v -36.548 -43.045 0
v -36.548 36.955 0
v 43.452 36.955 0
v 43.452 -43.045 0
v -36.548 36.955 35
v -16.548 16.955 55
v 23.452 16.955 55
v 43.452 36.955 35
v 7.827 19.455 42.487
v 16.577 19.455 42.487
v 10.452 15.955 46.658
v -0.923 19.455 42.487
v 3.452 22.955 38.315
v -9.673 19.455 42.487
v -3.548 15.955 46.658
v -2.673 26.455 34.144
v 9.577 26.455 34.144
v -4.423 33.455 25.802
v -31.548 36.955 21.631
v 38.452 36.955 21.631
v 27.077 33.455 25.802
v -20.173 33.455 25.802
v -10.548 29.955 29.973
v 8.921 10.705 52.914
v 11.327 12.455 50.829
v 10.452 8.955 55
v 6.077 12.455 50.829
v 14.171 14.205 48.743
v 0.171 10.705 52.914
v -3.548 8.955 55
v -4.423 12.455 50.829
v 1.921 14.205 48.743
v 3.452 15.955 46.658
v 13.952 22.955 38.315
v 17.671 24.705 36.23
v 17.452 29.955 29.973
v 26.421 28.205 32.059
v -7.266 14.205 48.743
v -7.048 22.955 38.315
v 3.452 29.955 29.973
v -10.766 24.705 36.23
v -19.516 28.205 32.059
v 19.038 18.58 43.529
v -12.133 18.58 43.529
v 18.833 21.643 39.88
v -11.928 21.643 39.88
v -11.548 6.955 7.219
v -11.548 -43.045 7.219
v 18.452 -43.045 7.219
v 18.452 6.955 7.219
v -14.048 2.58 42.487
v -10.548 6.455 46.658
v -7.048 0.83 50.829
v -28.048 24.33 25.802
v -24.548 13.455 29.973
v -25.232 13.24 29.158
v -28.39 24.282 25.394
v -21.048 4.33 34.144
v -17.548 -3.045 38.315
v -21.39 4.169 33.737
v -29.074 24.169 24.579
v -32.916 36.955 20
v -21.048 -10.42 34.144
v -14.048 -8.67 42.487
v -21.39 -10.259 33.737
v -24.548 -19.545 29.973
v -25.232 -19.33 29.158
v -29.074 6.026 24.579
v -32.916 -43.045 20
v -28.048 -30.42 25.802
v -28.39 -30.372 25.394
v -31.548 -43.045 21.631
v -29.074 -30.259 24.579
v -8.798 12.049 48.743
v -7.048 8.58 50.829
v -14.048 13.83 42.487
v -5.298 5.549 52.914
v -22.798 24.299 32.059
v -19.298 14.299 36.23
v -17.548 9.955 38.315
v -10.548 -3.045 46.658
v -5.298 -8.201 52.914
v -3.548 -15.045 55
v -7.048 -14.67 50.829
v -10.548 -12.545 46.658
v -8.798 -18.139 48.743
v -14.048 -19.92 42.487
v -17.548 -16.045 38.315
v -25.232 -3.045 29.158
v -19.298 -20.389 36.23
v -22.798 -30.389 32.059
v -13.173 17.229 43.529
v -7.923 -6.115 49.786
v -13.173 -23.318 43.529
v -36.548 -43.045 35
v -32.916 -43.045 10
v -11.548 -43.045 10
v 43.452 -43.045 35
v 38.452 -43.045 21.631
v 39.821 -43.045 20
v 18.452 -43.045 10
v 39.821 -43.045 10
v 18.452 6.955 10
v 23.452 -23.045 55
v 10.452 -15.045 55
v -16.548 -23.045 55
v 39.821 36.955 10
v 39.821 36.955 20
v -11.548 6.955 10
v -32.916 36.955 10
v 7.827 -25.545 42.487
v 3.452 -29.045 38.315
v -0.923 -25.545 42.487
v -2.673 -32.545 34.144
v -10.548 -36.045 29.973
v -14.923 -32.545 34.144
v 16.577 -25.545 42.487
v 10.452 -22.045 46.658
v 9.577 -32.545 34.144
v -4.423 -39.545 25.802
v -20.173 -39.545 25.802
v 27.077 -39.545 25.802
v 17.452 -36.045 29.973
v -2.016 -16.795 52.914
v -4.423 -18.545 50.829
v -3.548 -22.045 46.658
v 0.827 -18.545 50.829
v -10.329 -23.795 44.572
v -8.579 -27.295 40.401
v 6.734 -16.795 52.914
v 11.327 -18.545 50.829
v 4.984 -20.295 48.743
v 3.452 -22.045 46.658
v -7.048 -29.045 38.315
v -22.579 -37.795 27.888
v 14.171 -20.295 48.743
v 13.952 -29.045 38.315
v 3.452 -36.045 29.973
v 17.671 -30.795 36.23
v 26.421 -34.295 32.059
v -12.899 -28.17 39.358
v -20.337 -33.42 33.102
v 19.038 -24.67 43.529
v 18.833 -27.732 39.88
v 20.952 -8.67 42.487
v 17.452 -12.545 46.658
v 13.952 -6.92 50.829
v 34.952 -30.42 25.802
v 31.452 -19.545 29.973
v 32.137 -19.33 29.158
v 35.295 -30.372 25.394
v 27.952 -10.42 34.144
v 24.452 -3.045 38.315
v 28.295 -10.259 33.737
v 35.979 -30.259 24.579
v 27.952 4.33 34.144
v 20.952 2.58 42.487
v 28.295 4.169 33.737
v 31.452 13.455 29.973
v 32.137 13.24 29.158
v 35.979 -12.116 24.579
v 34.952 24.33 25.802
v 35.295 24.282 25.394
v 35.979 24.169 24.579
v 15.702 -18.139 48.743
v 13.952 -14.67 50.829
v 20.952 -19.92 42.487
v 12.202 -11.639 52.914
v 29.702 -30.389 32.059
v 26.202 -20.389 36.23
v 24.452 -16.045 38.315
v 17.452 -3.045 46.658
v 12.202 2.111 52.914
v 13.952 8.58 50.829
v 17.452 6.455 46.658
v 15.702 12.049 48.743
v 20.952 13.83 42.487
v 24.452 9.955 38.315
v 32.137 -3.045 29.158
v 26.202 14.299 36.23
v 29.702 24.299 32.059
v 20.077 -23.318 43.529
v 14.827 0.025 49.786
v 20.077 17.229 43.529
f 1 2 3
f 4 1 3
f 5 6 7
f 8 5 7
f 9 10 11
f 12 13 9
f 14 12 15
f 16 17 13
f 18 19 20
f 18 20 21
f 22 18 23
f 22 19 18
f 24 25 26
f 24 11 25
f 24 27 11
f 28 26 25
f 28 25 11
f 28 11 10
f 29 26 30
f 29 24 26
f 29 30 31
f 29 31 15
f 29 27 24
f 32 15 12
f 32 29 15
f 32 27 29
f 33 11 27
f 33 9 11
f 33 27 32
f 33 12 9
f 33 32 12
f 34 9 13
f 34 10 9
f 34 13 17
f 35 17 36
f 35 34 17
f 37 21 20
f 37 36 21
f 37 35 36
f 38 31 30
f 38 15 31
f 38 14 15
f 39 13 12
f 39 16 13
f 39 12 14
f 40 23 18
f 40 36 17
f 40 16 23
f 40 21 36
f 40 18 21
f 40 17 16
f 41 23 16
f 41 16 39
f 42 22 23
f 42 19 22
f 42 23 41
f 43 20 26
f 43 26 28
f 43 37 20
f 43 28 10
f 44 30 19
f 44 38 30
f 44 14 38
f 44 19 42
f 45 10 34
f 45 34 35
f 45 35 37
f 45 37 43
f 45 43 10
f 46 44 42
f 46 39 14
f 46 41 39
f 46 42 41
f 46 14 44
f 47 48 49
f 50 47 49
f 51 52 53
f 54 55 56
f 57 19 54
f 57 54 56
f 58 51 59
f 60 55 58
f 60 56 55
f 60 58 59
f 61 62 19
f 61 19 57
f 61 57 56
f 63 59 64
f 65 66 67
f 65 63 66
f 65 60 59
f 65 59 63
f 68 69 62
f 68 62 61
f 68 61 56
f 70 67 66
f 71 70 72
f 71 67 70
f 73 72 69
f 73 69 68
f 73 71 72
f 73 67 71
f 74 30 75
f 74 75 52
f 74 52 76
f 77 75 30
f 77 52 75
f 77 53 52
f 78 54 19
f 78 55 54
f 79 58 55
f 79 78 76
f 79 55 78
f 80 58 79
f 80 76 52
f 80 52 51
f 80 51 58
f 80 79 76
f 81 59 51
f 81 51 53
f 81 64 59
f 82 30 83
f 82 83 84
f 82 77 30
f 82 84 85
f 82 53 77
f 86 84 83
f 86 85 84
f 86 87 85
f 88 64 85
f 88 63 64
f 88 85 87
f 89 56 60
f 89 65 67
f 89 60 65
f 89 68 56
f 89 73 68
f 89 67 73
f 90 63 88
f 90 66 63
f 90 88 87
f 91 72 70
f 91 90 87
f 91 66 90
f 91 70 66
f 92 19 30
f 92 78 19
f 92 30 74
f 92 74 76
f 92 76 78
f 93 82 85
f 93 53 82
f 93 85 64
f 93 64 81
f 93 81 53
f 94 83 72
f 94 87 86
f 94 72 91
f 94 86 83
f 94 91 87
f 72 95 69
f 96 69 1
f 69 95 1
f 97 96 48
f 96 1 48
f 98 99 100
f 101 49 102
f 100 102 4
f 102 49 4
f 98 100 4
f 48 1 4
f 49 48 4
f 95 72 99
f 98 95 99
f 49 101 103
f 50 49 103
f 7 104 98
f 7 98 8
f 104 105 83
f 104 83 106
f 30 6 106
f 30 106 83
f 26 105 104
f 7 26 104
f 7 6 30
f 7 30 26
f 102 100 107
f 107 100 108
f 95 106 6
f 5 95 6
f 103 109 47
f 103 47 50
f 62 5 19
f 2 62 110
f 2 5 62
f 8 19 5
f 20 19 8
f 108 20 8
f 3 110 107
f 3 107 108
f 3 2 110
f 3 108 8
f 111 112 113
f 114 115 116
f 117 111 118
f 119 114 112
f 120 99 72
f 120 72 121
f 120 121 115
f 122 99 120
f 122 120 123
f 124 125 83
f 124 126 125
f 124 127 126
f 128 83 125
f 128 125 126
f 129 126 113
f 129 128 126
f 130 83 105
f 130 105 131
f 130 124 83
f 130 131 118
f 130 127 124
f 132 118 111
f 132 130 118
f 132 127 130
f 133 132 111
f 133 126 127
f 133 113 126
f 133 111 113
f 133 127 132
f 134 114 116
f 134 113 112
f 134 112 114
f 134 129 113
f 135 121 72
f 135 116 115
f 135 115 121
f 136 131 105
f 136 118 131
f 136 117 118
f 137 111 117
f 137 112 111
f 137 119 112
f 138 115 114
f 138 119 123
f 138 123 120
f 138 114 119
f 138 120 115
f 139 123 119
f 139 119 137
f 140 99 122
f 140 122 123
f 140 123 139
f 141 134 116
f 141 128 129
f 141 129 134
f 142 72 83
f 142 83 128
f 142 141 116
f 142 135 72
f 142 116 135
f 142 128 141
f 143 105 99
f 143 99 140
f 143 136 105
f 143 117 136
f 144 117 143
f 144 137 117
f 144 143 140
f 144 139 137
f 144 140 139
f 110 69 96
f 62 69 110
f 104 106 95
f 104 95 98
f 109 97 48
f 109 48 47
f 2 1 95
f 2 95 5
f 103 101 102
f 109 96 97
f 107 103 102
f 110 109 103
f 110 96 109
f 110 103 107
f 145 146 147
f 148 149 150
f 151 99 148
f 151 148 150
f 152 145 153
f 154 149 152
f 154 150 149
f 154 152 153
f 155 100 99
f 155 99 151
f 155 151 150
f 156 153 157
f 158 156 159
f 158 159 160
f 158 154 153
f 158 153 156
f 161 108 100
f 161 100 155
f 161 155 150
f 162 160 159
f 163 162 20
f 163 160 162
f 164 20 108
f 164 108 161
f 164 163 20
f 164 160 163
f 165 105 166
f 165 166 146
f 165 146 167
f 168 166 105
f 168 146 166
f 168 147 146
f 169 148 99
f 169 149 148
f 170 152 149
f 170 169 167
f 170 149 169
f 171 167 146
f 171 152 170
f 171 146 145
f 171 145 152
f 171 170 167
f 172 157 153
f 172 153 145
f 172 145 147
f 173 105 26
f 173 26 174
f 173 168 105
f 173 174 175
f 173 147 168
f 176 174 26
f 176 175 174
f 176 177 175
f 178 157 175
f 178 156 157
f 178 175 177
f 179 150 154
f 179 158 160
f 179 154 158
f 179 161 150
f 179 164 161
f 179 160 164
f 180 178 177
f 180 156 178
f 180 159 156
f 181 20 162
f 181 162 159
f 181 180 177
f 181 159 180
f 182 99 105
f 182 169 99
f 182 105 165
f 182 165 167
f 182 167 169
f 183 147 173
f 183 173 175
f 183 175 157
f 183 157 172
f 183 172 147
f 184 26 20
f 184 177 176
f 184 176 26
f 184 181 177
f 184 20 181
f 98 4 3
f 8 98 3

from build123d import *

# Parameters (mm, degrees)
F0_W     = 80
F0_H     = 80
F1_DEPTH = 55
F2_SIZE2 = 20
F2_SIZE  = 20
F3_W     = 14
F3_H     = 24
F4_DEPTH = 35
F4_TAPER = -40
F5_W     = 15
F5_H     = 2.5
F5_H_2   = 5.2806121111
F6_DEPTH = 50
F7_DEPTH = 10
F8_DEPTH = 5


# Not quite as in the source:
# - a feature names something its author has since deleted; it is built from what else it names


with BuildPart() as f1:
    # F0 (on Top) → F1 (new body)
    with BuildSketch(Plane.XY):
        with Locations((3.4524537623, -3.0448271871)):
            Rectangle(F0_W, F0_H)
    extrude(amount=F1_DEPTH)

    # F2
    f2_edges = [f1.edges().sort_by_distance(p)[0] for p in [
        (43.452454, -3.044827, 55),
        (3.452454, 36.955173, 55),
        (-36.547546, -3.044827, 55),
        (3.452454, -43.044827, 55),
    ]]
    chamfer(f2_edges, length=F2_SIZE, length2=F2_SIZE2)

    # F3 (on face) → F4 (cut)
    with BuildSketch(Plane.XY.offset(55)):
        with Locations((3.4524537623, -3.0448271871)):
            Rectangle(F3_W, F3_H)
    extrude(amount=-F4_DEPTH, taper=F4_TAPER, mode=Mode.SUBTRACT)

    # F5 (on face) → F6 (cut)
    with BuildSketch(Plane.XZ.offset(43.0448271871)):
        with Locations((10.9524537623, 18.75)):
            Rectangle(F5_W, F5_H)
        with Locations((-4.0475462377, 18.75)):
            Rectangle(F5_W, F5_H)
        with Locations((-4.0475462377, 14.8596939445)):
            Rectangle(F5_W, F5_H_2)
        with Locations((10.9524537623, 14.8596939445)):
            Rectangle(F5_W, F5_H_2)
    extrude(amount=-F6_DEPTH, mode=Mode.SUBTRACT)

    # F7 (cut): a face of the model
    f7_faces = [f1.faces().sort_by_distance(p)[0] for p in [
        (3.4524537623, 35.8739389153, 20),
    ]]
    extrude(f7_faces, amount=-F7_DEPTH, mode=Mode.SUBTRACT)

    # F8 (cut): a face of the model
    f8_faces = [f1.faces().sort_by_distance(p)[0] for p in [
        (3.4524537623, -18.0448271871, 12.2193878889),
    ]]
    extrude(f8_faces, amount=-F8_DEPTH, mode=Mode.SUBTRACT)


solid = f1.part
